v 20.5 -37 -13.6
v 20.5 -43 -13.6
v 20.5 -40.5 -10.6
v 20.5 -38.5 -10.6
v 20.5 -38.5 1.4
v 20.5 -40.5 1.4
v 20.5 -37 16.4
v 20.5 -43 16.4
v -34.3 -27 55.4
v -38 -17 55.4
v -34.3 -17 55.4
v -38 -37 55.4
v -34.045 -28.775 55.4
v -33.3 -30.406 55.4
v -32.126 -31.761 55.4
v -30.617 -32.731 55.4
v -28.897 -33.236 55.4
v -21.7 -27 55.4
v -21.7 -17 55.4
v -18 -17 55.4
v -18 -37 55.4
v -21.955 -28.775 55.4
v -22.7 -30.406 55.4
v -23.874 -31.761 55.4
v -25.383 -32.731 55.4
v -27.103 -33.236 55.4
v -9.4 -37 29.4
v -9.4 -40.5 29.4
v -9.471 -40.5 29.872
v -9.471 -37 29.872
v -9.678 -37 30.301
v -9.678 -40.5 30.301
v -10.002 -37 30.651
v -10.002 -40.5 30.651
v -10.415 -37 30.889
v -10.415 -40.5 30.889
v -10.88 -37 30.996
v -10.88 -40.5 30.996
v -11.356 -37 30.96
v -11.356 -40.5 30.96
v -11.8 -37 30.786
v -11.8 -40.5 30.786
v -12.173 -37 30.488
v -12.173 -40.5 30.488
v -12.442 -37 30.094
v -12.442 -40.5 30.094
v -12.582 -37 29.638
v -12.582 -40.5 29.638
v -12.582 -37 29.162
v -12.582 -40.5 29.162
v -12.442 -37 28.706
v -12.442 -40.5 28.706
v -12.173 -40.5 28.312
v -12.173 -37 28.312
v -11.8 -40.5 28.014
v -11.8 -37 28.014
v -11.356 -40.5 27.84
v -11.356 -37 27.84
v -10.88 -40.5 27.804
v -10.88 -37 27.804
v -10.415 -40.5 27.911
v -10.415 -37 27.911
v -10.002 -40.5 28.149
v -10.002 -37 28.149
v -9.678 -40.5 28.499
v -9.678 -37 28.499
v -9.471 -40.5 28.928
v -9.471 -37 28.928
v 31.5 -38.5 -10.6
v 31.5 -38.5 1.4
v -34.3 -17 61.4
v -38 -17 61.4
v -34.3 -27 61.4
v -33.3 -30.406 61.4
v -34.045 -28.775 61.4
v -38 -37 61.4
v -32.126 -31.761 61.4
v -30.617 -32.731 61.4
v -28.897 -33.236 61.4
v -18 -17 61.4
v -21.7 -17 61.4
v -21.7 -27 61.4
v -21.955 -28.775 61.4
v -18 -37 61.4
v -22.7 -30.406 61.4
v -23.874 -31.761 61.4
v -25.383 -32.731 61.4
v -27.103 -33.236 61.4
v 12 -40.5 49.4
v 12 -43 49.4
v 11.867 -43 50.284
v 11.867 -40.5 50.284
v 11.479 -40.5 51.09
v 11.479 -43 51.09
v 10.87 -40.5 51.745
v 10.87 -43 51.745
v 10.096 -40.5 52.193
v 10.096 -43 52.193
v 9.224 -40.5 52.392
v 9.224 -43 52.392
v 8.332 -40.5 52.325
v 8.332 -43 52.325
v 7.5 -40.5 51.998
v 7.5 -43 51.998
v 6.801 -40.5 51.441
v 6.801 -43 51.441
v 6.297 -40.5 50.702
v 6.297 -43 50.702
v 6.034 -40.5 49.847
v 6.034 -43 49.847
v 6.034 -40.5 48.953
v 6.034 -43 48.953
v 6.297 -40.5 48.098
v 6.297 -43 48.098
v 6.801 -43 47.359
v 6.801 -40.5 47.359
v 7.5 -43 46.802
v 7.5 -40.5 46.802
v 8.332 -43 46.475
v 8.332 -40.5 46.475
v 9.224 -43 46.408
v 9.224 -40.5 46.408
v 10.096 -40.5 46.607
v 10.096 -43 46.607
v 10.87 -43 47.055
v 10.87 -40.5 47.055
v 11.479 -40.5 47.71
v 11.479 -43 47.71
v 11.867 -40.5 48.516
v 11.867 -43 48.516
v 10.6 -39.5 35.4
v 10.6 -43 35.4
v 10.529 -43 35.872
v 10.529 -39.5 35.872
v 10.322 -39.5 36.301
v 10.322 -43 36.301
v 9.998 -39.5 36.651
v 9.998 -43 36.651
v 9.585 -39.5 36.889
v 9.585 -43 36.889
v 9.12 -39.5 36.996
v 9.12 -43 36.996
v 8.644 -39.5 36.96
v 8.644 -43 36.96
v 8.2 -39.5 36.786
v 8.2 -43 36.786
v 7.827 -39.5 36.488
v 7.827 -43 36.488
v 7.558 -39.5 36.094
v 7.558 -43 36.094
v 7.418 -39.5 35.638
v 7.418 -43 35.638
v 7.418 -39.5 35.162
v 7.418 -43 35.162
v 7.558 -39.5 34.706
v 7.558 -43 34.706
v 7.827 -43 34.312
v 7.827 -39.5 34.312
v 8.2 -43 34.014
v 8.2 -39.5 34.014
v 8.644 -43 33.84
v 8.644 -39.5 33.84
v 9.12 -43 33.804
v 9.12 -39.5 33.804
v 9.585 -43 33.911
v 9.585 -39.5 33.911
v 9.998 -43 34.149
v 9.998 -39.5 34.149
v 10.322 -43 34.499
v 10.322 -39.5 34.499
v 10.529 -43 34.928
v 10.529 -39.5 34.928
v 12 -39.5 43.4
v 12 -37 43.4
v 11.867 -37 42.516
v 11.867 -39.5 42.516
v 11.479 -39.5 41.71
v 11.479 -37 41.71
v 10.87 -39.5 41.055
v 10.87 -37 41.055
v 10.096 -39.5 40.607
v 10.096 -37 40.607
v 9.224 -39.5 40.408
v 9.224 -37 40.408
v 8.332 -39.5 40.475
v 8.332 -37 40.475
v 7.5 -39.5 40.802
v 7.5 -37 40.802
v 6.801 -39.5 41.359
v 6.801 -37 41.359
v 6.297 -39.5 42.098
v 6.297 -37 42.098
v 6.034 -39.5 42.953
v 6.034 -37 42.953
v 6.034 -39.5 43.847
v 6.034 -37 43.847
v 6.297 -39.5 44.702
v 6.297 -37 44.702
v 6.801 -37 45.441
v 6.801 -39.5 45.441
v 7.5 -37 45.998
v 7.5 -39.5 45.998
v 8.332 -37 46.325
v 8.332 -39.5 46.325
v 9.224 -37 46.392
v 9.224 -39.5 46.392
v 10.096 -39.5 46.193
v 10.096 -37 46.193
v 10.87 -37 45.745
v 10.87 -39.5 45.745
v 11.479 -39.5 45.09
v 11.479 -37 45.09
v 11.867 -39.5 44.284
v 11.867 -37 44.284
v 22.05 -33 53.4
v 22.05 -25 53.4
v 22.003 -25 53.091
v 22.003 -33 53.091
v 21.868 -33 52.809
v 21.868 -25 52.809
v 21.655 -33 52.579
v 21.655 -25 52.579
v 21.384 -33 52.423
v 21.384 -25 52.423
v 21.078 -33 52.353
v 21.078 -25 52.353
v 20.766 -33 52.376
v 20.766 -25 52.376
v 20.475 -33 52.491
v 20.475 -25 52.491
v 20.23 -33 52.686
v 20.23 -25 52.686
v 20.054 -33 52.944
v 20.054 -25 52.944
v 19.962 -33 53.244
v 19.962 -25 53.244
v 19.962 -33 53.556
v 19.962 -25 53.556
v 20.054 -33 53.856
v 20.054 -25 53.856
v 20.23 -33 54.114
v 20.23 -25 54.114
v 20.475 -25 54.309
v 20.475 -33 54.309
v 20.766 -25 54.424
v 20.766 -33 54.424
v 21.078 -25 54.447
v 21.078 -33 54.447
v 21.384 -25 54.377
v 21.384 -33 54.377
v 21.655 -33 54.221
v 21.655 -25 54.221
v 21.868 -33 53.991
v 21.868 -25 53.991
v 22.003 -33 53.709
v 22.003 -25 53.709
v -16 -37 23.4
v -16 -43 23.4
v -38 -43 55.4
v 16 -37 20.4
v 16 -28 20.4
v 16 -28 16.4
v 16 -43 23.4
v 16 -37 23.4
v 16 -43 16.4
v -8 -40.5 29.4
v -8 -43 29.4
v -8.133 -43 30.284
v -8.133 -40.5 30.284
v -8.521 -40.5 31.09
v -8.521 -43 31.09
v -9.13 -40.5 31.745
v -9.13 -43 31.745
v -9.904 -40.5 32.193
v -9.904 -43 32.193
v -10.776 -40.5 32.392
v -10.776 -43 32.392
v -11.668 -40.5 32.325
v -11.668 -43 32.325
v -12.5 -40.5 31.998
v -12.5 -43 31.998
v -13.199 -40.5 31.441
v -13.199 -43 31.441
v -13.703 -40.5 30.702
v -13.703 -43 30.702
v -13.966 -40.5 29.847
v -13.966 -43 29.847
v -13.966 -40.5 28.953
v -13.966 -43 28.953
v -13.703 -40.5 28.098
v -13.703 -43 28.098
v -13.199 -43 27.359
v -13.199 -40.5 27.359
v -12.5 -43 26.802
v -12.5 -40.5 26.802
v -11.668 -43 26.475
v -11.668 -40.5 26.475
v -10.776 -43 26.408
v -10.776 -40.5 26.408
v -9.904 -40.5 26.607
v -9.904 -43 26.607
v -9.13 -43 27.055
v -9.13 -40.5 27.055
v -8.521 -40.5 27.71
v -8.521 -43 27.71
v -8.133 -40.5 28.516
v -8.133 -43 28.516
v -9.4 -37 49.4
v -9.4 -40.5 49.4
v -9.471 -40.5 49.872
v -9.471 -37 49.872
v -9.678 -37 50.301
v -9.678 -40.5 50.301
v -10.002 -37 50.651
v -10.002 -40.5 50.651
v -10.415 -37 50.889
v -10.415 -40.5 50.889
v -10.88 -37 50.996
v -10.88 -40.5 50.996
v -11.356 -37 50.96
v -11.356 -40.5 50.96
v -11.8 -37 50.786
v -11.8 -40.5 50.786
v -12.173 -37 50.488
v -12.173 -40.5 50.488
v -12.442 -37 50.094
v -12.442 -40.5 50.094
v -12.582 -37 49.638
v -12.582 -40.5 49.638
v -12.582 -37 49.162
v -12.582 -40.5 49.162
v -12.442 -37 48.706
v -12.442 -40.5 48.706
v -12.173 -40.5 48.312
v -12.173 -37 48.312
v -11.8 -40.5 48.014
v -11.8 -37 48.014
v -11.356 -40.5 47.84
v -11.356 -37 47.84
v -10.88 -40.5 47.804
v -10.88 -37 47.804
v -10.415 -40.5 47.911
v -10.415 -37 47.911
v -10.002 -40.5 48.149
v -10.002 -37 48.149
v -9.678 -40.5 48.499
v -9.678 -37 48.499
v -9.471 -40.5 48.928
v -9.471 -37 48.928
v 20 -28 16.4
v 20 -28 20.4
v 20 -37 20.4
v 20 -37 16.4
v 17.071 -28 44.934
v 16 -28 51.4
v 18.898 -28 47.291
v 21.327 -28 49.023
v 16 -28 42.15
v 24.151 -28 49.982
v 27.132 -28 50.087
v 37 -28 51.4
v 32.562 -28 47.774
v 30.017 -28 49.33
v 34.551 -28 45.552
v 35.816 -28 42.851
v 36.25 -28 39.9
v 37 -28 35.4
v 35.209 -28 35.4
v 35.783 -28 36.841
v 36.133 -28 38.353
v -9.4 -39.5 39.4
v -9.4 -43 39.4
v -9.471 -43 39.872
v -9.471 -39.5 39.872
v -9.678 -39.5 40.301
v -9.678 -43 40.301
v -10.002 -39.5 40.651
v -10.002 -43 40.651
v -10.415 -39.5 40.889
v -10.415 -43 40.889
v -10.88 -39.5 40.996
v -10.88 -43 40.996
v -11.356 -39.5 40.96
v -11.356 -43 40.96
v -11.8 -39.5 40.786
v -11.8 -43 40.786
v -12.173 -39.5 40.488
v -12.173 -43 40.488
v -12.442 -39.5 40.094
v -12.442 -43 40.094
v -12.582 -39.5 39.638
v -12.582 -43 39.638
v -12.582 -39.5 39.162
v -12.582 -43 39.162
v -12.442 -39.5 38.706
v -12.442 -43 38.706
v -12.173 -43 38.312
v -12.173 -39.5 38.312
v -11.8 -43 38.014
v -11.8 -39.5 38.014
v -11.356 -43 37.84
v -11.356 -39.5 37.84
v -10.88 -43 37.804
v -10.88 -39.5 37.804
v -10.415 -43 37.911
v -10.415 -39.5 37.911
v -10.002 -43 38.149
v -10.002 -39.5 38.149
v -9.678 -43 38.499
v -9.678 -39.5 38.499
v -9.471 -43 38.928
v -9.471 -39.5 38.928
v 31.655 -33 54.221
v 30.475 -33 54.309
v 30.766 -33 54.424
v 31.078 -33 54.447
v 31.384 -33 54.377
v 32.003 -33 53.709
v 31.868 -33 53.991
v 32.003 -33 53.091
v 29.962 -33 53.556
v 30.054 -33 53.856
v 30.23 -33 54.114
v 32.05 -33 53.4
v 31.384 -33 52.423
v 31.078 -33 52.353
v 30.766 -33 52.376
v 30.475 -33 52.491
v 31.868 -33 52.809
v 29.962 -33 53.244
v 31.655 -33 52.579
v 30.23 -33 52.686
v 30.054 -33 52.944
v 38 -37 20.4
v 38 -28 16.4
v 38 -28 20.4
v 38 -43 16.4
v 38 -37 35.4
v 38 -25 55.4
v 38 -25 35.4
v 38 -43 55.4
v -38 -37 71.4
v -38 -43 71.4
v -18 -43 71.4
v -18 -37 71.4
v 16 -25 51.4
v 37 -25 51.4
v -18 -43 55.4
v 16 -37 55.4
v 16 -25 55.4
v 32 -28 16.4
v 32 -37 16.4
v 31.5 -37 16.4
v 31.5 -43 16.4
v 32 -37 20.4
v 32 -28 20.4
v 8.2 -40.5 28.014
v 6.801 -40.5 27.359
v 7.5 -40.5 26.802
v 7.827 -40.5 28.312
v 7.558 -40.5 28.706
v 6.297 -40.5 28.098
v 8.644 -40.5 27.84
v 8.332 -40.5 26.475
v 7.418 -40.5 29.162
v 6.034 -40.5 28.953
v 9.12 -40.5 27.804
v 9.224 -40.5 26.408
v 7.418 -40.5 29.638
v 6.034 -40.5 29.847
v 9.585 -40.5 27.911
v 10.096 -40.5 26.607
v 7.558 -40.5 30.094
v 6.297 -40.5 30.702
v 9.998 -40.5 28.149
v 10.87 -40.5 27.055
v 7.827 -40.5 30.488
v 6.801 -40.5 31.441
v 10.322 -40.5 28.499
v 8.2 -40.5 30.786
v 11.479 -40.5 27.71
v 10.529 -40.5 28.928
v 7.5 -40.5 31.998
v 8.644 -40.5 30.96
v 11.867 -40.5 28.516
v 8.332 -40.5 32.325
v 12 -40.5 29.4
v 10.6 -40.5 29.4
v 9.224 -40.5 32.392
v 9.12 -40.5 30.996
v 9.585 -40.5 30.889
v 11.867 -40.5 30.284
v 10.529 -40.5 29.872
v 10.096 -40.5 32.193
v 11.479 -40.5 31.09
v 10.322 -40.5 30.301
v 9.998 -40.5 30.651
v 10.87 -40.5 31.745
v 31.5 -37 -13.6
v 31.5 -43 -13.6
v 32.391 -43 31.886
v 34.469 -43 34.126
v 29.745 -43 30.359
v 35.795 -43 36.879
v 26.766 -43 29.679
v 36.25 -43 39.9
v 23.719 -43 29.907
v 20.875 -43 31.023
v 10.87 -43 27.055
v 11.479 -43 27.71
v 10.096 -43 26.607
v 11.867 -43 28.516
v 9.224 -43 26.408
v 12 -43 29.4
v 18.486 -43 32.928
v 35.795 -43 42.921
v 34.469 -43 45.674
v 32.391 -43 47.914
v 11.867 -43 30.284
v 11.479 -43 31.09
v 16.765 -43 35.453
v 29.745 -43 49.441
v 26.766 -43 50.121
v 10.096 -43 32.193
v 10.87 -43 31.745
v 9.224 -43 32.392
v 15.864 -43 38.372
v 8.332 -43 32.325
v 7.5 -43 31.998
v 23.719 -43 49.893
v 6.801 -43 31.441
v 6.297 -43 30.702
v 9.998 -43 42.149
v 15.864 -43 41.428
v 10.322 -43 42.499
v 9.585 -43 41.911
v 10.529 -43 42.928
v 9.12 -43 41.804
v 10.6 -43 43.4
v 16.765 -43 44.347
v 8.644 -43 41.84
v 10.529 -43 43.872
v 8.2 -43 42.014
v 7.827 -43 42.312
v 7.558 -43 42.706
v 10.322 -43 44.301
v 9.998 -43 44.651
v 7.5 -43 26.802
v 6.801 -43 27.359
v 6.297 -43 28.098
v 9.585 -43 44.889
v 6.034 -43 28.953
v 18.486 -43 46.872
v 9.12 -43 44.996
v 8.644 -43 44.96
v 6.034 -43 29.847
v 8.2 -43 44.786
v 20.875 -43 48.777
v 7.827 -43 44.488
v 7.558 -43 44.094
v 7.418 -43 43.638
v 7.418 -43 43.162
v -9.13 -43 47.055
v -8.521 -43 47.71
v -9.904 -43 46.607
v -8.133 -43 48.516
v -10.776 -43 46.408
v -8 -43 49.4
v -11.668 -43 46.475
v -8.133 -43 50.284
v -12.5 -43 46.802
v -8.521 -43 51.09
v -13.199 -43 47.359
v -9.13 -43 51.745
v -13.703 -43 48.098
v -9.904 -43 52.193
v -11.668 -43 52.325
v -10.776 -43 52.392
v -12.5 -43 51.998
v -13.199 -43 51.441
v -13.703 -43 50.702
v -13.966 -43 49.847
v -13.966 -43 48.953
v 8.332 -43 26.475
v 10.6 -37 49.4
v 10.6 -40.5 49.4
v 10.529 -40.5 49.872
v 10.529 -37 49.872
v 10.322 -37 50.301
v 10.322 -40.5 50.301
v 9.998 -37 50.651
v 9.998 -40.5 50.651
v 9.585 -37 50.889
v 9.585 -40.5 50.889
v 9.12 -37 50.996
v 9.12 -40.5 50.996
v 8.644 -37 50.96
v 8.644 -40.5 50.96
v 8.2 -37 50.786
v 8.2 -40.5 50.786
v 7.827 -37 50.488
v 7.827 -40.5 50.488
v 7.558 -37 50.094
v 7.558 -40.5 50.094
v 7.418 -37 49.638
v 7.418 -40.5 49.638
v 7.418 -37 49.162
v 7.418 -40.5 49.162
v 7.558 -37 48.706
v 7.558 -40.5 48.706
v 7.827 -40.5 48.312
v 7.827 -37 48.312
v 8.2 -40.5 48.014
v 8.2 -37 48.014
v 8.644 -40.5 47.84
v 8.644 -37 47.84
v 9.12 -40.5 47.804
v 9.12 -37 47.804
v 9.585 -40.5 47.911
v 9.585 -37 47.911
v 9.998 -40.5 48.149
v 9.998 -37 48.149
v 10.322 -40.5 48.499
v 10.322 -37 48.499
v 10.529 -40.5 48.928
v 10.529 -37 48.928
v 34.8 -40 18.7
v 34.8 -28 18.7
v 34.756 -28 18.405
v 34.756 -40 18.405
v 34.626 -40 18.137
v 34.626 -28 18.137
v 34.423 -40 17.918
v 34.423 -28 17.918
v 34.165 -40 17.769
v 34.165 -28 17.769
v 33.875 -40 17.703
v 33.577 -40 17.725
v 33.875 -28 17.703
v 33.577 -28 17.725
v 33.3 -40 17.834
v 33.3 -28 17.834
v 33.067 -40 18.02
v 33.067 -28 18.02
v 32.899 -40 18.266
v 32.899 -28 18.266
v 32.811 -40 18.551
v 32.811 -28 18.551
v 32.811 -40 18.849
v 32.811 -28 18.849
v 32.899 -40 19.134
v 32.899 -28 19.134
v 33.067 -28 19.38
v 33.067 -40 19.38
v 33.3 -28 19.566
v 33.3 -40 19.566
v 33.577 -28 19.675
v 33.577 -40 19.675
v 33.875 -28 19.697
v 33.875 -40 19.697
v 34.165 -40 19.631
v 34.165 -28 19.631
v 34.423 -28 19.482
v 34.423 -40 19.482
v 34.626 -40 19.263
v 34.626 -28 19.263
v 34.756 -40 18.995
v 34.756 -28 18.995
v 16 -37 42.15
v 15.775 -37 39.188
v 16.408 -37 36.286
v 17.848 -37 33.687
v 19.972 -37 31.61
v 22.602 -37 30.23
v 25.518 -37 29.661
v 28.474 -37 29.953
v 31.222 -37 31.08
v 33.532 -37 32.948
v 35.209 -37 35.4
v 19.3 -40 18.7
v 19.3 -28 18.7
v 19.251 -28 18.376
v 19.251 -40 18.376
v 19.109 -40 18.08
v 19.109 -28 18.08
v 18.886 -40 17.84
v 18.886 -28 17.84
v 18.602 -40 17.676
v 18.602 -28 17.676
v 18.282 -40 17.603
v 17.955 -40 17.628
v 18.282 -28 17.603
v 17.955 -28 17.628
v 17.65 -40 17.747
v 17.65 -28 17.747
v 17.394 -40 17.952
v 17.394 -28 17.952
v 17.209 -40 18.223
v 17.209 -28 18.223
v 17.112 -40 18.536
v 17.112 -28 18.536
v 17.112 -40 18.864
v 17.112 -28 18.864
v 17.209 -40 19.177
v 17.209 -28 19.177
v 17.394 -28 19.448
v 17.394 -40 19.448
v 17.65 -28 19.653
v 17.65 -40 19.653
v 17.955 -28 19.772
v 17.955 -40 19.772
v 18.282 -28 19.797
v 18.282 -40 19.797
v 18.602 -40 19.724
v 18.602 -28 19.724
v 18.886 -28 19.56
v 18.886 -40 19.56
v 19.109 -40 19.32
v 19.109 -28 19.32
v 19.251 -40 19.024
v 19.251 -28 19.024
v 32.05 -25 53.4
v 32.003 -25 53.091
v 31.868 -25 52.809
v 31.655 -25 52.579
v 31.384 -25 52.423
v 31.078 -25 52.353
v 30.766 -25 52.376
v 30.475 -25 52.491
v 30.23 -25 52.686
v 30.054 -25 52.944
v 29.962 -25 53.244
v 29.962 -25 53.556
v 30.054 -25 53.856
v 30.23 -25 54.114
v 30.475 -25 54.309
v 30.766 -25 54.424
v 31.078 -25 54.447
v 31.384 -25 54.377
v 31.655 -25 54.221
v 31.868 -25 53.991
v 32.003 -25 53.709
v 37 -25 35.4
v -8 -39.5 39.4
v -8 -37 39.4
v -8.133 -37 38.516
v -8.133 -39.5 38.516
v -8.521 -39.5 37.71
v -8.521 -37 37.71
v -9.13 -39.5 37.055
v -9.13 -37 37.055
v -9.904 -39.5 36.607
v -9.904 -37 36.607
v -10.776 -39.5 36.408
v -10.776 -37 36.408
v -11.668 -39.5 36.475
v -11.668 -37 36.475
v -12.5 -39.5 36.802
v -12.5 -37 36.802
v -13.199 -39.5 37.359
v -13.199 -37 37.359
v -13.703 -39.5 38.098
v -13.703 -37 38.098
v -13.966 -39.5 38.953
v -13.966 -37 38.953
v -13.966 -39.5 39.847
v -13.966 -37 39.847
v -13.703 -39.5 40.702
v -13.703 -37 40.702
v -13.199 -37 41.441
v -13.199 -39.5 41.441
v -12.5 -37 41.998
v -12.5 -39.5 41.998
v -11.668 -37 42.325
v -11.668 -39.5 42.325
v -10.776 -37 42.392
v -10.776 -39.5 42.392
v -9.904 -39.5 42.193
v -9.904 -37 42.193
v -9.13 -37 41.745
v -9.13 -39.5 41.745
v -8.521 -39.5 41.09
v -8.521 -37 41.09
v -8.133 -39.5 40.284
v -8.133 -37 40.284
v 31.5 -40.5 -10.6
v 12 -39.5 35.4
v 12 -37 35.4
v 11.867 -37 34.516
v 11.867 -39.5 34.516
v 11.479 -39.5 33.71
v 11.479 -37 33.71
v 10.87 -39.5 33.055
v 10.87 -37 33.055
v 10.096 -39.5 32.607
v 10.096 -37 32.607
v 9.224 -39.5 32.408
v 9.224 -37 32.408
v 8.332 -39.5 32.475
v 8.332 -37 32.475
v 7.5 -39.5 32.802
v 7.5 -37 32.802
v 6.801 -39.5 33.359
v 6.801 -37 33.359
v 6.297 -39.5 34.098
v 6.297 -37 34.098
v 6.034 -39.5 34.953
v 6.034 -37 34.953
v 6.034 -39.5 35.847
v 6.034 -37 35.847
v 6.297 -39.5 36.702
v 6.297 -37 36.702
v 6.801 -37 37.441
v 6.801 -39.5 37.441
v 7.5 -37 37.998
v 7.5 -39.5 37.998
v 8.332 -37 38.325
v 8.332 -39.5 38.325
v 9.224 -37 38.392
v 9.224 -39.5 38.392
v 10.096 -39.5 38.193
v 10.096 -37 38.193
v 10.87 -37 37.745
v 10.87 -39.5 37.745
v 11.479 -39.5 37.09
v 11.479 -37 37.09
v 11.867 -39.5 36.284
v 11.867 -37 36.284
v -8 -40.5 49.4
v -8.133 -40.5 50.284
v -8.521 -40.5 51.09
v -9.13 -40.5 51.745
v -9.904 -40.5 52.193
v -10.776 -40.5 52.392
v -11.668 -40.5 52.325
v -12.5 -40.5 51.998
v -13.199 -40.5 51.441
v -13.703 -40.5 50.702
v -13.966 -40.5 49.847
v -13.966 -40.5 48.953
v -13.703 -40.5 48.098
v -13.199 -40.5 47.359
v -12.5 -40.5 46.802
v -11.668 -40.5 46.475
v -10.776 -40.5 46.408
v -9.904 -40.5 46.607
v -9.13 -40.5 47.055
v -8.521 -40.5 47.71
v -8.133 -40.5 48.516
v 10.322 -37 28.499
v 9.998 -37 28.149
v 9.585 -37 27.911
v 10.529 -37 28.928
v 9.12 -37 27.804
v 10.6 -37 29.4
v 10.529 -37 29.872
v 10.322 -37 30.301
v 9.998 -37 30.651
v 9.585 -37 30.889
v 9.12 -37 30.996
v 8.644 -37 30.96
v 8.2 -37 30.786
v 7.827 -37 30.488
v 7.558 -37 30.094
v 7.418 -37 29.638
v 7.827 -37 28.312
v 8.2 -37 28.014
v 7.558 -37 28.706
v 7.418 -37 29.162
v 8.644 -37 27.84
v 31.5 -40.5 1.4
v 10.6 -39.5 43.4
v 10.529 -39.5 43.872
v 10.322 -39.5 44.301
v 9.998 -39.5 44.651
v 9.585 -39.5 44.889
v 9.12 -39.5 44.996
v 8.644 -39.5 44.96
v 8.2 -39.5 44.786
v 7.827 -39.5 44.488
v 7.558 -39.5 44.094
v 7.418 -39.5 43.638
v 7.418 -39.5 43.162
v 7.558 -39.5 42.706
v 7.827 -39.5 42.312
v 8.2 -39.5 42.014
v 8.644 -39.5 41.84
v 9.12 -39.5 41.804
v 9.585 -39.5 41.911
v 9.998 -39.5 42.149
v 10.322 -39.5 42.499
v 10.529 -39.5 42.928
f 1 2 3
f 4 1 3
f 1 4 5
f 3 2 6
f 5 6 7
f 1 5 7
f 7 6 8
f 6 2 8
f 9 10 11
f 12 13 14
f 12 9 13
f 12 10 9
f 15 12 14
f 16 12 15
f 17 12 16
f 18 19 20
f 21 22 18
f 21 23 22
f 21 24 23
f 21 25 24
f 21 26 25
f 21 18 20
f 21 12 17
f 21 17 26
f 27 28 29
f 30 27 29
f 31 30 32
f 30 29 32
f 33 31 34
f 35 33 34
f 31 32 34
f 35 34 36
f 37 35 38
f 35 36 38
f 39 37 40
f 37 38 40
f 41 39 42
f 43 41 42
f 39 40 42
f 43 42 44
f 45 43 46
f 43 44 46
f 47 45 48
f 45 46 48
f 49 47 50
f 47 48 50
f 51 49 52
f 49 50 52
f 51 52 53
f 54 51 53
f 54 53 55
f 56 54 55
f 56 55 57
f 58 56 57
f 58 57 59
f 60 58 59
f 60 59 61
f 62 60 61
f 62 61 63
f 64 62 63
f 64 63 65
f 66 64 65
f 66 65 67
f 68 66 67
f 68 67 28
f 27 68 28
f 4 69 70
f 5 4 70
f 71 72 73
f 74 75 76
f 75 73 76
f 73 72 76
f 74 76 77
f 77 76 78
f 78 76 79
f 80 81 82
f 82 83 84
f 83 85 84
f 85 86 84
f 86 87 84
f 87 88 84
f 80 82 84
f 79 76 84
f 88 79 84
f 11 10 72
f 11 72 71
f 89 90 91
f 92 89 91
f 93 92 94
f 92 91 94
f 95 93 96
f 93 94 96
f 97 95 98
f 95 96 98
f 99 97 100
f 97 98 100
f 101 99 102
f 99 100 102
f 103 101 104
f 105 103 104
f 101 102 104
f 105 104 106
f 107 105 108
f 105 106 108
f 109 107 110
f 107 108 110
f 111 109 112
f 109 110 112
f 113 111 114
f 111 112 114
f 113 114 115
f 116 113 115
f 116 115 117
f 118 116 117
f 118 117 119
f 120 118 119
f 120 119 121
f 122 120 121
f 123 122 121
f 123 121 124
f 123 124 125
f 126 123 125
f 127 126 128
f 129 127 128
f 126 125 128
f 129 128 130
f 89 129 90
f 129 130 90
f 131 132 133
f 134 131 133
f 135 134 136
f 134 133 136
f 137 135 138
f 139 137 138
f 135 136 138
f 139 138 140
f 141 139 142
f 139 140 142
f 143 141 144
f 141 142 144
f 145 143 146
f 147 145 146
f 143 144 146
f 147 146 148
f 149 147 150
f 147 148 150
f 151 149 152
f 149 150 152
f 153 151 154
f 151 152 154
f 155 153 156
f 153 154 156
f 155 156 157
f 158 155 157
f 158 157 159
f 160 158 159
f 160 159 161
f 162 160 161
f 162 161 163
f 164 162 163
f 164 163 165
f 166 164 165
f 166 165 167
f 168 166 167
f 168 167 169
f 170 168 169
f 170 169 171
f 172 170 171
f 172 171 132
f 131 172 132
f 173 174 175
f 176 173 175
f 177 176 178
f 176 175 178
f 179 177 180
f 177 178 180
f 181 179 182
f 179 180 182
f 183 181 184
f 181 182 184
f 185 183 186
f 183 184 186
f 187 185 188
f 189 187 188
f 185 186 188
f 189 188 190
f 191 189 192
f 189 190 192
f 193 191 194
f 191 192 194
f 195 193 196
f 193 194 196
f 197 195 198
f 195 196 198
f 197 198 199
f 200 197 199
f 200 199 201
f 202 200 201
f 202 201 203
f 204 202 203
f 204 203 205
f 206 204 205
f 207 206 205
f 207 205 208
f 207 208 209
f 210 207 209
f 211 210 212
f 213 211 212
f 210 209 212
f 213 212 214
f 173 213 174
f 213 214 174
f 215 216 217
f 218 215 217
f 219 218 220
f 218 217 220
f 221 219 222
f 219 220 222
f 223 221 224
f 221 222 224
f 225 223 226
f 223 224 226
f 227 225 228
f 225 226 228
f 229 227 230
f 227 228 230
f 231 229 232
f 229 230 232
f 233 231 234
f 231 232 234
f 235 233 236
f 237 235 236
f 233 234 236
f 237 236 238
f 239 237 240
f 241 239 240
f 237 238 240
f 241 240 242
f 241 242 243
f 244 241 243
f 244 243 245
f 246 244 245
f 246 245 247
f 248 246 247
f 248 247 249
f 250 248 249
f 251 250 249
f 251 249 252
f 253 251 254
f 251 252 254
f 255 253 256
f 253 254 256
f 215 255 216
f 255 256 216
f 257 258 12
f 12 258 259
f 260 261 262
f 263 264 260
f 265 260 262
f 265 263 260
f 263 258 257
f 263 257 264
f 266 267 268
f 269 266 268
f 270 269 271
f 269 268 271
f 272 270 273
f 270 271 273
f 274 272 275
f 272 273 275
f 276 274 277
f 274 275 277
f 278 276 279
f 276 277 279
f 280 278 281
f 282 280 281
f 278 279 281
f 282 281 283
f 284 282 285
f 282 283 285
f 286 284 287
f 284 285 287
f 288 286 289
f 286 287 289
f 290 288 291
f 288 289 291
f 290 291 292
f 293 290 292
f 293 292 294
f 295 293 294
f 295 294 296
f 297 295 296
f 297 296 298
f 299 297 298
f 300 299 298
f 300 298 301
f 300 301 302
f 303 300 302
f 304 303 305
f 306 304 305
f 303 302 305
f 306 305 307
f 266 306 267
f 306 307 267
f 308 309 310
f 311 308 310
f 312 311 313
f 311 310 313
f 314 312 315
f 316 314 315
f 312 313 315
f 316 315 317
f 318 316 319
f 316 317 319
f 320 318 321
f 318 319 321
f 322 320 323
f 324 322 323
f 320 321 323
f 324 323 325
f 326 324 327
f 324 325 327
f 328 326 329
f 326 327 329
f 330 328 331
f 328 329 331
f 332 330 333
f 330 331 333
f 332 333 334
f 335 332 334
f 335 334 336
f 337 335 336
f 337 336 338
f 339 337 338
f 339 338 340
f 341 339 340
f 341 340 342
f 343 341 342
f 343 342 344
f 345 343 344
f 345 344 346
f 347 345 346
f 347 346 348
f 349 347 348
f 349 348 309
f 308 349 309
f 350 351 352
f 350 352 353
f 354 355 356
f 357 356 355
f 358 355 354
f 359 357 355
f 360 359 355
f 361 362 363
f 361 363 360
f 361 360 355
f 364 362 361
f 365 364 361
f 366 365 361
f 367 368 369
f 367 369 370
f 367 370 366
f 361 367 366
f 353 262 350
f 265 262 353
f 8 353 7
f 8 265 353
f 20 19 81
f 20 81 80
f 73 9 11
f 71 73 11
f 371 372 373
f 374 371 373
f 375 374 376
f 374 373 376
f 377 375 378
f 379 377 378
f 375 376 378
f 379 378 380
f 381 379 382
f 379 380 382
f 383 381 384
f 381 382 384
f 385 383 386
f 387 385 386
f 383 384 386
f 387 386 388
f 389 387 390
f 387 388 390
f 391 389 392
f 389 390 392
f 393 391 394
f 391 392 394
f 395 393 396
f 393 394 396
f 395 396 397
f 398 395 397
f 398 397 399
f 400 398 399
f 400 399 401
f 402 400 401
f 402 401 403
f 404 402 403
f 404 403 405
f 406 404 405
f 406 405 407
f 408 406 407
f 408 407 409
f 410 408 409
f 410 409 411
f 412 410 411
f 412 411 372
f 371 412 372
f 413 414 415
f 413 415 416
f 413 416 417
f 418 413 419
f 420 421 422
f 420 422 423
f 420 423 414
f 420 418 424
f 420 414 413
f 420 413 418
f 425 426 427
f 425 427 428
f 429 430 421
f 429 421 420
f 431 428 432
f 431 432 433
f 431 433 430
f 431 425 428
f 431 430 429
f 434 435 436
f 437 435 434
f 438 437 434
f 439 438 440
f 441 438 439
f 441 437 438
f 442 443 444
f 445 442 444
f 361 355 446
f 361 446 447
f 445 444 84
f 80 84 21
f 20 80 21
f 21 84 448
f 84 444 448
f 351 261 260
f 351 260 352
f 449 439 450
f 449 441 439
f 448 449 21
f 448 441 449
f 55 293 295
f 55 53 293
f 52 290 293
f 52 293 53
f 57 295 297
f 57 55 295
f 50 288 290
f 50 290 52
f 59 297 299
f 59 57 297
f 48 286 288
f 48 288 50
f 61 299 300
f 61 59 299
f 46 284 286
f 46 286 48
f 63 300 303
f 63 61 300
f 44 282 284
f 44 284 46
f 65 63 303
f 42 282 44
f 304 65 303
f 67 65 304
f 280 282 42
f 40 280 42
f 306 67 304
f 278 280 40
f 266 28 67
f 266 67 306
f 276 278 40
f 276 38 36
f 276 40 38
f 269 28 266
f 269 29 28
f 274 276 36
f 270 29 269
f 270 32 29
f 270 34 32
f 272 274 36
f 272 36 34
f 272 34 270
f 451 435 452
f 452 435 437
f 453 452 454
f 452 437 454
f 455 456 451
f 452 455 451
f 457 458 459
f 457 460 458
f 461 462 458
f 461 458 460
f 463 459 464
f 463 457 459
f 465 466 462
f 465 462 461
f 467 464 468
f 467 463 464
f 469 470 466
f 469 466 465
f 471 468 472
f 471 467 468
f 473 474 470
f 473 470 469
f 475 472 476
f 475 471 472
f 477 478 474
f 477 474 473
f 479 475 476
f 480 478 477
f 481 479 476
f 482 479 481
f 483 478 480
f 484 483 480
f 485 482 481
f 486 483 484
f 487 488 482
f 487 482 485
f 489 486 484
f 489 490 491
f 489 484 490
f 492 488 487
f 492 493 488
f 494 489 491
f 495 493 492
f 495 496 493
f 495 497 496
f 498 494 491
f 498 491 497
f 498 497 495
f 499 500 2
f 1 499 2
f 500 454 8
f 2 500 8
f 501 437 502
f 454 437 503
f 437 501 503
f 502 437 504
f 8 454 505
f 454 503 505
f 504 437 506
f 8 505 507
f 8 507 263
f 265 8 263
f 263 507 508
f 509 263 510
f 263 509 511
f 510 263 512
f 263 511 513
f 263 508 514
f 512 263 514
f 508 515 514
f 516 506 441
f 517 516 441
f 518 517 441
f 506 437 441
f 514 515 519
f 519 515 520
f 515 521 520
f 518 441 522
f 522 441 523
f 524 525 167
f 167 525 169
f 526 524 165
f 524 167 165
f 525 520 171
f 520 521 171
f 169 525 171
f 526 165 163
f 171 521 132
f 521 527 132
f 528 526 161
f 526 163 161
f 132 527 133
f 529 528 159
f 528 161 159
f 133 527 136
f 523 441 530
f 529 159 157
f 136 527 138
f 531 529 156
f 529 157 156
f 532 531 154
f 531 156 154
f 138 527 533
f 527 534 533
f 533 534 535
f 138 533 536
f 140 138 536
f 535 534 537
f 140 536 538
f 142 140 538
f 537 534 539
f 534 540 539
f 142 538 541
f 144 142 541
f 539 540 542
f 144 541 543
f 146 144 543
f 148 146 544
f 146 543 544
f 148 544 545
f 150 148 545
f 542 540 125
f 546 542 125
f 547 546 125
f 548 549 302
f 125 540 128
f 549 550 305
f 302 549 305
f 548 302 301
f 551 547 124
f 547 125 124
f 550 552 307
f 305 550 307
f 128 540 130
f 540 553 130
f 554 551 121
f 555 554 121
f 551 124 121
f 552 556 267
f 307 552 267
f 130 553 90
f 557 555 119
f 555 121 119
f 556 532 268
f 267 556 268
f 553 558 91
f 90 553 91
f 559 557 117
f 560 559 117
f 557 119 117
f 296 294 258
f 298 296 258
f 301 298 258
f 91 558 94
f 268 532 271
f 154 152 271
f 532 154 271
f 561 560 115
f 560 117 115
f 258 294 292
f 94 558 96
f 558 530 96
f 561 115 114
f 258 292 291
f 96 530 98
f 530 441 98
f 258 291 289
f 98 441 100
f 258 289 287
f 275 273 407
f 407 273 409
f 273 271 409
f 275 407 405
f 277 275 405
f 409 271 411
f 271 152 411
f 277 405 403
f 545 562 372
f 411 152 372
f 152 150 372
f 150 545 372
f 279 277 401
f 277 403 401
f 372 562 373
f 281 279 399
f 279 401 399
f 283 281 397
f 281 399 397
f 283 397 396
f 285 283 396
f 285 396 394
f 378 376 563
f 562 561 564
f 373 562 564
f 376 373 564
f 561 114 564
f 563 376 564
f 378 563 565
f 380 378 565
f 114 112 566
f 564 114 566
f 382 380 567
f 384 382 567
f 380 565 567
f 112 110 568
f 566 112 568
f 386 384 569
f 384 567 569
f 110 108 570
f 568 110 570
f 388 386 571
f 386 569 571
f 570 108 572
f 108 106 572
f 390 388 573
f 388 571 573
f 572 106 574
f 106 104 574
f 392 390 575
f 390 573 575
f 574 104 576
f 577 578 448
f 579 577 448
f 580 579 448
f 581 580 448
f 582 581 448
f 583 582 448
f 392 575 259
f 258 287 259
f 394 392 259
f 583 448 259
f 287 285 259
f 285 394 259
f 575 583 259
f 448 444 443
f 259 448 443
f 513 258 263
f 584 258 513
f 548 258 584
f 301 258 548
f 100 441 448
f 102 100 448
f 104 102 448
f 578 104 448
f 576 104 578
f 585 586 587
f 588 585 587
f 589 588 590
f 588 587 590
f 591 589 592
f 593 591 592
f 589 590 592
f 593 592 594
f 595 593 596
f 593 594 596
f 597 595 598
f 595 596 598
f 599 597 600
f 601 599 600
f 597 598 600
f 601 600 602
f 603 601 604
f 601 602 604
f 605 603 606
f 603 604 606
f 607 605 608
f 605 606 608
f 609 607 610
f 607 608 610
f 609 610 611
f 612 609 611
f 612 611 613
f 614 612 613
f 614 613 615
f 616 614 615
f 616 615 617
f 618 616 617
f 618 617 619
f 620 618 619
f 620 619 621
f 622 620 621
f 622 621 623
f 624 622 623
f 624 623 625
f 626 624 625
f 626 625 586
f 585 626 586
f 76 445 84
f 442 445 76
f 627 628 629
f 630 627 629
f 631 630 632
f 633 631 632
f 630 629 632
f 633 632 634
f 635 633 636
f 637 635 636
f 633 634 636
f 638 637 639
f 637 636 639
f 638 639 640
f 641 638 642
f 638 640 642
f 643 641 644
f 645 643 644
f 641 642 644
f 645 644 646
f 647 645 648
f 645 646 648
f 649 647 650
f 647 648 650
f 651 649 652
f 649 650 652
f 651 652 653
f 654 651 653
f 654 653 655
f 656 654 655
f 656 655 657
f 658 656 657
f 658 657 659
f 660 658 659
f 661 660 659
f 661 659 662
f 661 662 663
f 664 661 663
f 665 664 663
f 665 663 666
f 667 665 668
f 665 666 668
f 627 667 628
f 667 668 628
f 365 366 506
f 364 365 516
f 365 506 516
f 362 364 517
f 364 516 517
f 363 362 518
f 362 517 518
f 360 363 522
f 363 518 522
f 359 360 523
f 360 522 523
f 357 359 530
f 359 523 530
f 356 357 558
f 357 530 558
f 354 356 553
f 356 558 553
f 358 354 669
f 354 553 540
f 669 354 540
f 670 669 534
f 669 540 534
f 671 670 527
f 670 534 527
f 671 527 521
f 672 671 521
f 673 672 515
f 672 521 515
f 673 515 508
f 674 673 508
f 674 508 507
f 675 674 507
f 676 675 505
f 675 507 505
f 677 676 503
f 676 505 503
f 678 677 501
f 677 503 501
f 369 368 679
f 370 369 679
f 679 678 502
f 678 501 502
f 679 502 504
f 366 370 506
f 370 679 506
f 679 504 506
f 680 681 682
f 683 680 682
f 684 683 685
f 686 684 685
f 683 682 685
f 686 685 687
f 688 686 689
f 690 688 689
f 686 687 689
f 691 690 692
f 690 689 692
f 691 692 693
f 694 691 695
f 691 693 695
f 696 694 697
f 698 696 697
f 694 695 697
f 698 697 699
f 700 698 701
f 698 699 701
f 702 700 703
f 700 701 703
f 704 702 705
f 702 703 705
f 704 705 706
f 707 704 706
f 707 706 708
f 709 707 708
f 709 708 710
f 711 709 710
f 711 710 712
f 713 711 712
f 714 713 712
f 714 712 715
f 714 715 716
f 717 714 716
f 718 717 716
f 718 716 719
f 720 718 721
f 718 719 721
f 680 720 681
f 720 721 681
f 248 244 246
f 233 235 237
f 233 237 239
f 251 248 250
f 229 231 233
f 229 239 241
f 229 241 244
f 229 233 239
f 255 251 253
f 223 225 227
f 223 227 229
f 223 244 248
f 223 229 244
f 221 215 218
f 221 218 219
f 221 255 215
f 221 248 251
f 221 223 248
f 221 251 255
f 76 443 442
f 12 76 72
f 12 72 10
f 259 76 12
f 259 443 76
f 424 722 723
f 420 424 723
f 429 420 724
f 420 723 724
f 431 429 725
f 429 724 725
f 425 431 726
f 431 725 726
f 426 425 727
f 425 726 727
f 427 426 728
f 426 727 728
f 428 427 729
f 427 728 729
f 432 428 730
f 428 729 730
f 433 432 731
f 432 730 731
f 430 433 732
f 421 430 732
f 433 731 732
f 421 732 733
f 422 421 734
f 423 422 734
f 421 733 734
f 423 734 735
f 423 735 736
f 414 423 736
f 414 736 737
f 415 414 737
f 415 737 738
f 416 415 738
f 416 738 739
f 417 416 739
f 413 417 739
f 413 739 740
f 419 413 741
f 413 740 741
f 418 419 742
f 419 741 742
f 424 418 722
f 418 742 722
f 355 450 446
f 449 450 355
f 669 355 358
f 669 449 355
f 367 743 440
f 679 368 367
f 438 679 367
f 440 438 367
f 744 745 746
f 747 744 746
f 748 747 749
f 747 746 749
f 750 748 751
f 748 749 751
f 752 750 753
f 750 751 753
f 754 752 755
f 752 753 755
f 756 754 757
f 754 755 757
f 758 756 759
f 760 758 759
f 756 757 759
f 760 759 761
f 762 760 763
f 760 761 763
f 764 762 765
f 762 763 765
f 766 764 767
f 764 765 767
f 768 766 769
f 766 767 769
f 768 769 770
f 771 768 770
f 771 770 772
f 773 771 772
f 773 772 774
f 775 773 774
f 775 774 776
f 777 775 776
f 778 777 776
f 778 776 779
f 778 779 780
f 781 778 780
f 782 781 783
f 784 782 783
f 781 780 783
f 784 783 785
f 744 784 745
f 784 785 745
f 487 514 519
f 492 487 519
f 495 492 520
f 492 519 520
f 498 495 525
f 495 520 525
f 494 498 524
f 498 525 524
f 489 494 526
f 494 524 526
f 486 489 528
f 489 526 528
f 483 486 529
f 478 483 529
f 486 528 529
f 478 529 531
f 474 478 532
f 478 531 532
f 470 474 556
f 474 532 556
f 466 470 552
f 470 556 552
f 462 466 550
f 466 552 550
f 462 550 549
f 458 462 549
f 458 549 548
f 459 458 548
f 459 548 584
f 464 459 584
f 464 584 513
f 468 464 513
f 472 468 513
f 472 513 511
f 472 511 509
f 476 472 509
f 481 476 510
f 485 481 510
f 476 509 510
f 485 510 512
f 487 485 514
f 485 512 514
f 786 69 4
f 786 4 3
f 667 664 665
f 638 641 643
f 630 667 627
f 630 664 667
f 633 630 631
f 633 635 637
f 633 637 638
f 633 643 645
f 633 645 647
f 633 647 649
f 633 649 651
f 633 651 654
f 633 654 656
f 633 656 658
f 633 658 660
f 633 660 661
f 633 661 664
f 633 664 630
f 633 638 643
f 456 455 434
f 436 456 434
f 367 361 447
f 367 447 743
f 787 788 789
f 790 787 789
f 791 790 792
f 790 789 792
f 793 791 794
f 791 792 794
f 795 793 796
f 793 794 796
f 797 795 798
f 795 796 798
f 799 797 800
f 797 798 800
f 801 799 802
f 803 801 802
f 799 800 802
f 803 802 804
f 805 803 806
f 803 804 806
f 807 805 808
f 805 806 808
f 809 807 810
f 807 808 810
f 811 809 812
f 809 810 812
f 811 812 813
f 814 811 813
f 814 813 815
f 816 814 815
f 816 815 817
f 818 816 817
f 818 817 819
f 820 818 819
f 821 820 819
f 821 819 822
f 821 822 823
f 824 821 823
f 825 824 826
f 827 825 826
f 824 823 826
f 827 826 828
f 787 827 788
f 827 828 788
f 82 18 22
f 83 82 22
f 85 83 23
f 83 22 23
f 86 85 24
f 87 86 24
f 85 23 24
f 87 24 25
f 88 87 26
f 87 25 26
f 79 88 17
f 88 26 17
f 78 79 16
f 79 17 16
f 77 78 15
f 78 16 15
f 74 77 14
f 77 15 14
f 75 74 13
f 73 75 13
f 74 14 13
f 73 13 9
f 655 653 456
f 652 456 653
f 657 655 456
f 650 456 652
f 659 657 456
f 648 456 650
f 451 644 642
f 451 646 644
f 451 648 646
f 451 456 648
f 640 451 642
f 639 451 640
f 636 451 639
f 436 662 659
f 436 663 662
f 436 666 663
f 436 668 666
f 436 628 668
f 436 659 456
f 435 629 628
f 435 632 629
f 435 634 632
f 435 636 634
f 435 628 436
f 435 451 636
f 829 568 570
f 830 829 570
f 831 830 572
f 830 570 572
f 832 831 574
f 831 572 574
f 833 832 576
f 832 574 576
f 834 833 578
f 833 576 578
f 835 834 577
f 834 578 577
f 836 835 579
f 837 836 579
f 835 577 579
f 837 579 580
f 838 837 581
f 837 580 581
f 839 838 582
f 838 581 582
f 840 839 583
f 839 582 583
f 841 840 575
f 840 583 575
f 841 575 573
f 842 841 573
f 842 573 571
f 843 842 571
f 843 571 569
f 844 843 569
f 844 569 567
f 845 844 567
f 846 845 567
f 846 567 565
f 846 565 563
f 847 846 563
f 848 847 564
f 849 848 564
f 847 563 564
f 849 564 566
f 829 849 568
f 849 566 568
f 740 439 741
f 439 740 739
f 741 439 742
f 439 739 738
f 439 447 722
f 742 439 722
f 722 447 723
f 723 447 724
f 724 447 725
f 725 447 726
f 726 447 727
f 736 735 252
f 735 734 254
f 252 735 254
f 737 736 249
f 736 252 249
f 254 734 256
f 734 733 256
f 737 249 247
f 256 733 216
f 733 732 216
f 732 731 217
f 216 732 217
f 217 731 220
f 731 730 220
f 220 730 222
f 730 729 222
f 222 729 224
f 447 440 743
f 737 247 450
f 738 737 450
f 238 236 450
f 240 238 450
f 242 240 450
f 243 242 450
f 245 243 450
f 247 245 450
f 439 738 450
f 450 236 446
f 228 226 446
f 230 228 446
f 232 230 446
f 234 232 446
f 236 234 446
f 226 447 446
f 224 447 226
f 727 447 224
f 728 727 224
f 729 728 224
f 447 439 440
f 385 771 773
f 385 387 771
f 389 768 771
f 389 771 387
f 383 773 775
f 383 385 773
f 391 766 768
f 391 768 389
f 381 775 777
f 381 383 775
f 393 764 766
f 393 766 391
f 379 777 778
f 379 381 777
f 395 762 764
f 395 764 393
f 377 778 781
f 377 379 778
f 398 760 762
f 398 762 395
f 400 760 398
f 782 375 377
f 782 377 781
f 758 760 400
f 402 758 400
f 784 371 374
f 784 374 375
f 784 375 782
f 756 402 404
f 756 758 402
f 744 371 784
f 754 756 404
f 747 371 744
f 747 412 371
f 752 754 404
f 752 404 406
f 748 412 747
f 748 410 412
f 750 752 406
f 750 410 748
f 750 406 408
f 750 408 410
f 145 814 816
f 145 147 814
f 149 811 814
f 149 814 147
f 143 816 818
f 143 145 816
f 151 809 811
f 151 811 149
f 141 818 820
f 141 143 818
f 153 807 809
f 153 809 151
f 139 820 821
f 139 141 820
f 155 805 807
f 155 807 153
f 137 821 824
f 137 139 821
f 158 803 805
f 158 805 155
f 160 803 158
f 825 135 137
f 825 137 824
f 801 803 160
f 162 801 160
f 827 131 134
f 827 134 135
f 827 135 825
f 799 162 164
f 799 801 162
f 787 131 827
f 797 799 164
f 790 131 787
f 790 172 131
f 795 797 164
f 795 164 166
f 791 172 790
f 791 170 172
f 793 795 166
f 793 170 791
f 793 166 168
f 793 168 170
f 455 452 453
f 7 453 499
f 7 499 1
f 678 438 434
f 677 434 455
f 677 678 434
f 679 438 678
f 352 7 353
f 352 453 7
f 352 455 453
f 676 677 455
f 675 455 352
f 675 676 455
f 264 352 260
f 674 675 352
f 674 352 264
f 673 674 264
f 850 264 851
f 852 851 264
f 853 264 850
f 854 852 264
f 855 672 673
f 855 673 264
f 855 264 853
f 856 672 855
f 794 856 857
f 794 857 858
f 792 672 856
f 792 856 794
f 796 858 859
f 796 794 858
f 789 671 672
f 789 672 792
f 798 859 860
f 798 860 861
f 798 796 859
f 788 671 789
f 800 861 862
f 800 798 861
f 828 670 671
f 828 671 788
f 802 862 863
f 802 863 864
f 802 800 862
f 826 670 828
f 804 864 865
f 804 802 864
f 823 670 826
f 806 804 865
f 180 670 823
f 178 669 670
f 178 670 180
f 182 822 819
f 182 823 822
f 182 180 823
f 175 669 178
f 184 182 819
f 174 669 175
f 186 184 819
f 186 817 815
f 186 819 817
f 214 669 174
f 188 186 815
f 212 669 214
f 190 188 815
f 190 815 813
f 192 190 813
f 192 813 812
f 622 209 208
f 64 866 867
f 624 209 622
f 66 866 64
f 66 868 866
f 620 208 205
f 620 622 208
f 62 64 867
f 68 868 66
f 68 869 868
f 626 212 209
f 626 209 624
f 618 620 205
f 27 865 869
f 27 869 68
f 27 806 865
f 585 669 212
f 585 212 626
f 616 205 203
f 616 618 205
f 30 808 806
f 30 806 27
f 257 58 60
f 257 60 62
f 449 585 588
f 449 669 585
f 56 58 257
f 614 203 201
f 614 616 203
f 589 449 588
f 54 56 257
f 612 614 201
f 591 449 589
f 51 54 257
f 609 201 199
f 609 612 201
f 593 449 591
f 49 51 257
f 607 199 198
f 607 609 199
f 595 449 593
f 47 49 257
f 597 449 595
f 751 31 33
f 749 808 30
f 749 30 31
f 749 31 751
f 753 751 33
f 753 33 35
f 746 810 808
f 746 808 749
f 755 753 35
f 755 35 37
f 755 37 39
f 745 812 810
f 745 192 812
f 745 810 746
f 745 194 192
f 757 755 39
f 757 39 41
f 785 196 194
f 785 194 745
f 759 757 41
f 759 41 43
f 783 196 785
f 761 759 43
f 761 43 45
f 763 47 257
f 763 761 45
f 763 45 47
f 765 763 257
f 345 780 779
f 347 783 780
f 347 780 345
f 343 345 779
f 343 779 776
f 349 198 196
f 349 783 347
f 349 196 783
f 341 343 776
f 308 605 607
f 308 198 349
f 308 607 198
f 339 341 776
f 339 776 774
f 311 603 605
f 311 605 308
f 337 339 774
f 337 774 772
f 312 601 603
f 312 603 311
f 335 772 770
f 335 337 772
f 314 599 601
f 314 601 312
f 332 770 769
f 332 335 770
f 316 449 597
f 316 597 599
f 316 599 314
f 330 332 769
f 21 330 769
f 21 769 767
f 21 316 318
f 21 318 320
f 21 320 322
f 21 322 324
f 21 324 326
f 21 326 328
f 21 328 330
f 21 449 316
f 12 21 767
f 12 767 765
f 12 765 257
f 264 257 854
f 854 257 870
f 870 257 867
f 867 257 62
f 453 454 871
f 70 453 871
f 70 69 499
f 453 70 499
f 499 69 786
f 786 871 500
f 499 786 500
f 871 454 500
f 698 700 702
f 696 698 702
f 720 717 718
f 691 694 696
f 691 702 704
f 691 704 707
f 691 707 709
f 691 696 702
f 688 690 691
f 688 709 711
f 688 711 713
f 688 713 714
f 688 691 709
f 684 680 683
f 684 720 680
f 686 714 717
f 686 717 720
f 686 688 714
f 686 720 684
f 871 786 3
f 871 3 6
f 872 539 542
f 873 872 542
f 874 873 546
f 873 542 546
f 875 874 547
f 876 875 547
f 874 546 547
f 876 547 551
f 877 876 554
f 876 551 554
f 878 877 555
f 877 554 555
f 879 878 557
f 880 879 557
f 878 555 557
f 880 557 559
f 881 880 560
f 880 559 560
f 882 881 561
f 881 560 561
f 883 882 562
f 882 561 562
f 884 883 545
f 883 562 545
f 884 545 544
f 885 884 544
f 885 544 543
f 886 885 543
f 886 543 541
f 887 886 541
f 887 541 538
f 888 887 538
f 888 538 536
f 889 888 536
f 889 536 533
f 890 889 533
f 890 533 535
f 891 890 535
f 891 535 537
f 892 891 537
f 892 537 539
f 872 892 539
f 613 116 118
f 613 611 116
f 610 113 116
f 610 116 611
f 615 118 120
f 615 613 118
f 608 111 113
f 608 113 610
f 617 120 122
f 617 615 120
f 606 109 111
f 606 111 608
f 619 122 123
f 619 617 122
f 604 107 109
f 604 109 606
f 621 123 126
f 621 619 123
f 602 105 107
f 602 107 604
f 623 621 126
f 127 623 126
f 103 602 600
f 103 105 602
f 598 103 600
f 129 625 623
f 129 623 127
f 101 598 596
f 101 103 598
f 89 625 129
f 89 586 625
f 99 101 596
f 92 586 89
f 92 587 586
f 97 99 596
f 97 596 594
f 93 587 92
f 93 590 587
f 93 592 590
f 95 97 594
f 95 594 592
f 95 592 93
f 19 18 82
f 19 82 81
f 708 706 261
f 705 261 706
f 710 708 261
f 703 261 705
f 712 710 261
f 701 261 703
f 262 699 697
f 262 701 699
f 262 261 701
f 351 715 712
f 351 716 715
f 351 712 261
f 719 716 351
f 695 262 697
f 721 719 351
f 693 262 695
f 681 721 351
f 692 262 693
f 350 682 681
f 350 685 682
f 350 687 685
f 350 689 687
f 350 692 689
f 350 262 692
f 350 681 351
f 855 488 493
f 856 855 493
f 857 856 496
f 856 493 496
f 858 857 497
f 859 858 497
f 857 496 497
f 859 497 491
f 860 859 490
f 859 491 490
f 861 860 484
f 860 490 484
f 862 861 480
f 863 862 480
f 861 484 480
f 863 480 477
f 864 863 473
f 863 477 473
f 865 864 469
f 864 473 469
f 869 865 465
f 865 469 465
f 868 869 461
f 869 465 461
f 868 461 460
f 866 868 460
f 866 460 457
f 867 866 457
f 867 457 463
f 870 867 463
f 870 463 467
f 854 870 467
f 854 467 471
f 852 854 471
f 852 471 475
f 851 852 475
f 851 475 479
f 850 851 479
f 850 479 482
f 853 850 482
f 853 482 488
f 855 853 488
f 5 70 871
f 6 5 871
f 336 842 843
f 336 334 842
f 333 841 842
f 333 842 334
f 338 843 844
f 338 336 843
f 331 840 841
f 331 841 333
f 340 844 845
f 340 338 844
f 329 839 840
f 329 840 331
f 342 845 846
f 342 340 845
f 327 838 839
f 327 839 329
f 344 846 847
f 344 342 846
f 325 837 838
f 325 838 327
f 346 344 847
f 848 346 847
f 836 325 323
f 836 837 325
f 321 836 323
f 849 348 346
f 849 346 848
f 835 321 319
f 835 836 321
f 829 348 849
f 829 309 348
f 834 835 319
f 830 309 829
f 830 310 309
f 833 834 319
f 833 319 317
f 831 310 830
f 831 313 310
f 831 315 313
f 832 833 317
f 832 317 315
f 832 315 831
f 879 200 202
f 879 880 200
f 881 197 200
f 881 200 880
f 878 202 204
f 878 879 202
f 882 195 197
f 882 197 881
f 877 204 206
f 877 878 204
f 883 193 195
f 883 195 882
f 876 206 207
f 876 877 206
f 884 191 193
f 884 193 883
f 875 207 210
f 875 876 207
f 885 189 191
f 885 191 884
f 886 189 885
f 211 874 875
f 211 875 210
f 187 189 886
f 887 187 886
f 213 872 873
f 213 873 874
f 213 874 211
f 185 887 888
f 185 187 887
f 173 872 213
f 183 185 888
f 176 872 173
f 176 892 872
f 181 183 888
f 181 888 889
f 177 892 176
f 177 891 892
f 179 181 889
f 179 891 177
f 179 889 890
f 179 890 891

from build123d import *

# Parameters (mm, degrees)
SKETCH033_W     = 30
SKETCH033_H     = 32
PAD023_DEPTH    = 6
PAD024_DEPTH    = 6
SKETCH035_R     = 1.6
POCKET011_DEPTH = 6
SKETCH038_W     = 4
SKETCH038_H     = 4
SKETCH038_W_2   = 6
PAD027_DEPTH    = 9
SKETCH039_R     = 1.1
SKETCH039_R_2   = 1
POCKET012_DEPTH = 12
SKETCH040_R     = 10.25
POCKET013_DEPTH = 100
PAD028_DEPTH    = 9
POCKET014_DEPTH = 15
PAD029_DEPTH    = 3
SKETCH043_W     = 12
SKETCH043_H     = 2
POCKET015_DEPTH = 11
SKETCH045_W     = 20
SKETCH045_H     = 6
PAD030_DEPTH    = 20
POCKET016_DEPTH = 12
SKETCH047_R     = 1.6
POCKET017_DEPTH = 6
SKETCH048_R     = 3
POCKET018_DEPTH = 2.5
SKETCH049_R     = 3
POCKET019_DEPTH = 2.5
SKETCH058_R     = 1.05
POCKET021_DEPTH = 8


with BuildPart() as part:
    # Sketch033 → Pad023 (new body)
    with BuildSketch(Plane.XZ):
        Rectangle(SKETCH033_W, SKETCH033_H)
    extrude(amount=PAD023_DEPTH)

    # Sketch034 (on Face6 of Pad023) → Pad024 (join)
    with BuildSketch(Plane.XZ.offset(6)):
        Polygon((-15, 16), (15, 16), (39, 16), (39, -23), (32.5, -23), (32.5, -53), (21.5, -53), (21.5, -23), (17, -23), (17, -16), (15, -16), (-15, -16), (-37, 16), (-37, 32), (-17, 32), (-17, 16), align=None)
    extrude(amount=-PAD024_DEPTH)

    # Sketch035 (on Face14 of Pad024) → Pocket011 (cut)
    with BuildSketch(Plane.XZ.offset(6)):
        with Locations((-10, 10)):
            Circle(SKETCH035_R)
        with Locations((10, 10)):
            Circle(SKETCH035_R)
        with Locations((10, -10)):
            Circle(SKETCH035_R)
        with Locations((-10, -10)):
            Circle(SKETCH035_R)
    extrude(amount=-POCKET011_DEPTH, mode=Mode.SUBTRACT)

    # Sketch038 (on Face5 of Pocket011) → Pad027 (join)
    with BuildSketch(Plane(origin=(0, 0, 0), x_dir=(1, 0, 0), z_dir=(0, 1, 0))):
        with Locations((19, 21)):
            Rectangle(SKETCH038_W, SKETCH038_H)
        with Locations((36, 21)):
            Rectangle(SKETCH038_W_2, SKETCH038_H)
    extrude(amount=PAD027_DEPTH)

    # Sketch039 (on Face21 of Pad027) → Pocket012 (cut)
    with BuildSketch(Plane(origin=(0, 9, 0), x_dir=(1, 0, 0), z_dir=(0, 1, 0))):
        with Locations((19.2, 20.7)):
            Circle(SKETCH039_R)
        with Locations((34.8, 20.7)):
            Circle(SKETCH039_R_2)
    extrude(amount=-POCKET012_DEPTH, mode=Mode.SUBTRACT)

    # Sketch040 (on Face4 of Pocket012) → Pocket013 (cut)
    with BuildSketch(Plane.XZ.offset(6)):
        with Locations((27, 0.5)):
            Circle(SKETCH040_R)
    extrude(amount=-POCKET013_DEPTH, mode=Mode.SUBTRACT)

    # Sketch041 (on Face5 of Pocket013) → Pad028 (join)
    with BuildSketch(Plane(origin=(0, 0, 0), x_dir=(1, 0, 0), z_dir=(0, 1, 0))):
        Polygon((39, -16), (39, 4), (32, 4), (32, 0), (17, 0), (17, -16), align=None)
    extrude(amount=PAD028_DEPTH)

    # Sketch040 (on Face4 of Pocket012) → Pocket014 (cut)
    with BuildSketch(Plane.XZ.offset(6)):
        with Locations((27, 0.5)):
            Circle(SKETCH040_R)
    extrude(amount=-POCKET014_DEPTH, mode=Mode.SUBTRACT)

    # Sketch042 (on Face27 of Pocket014) → Pad029 (join)
    with BuildSketch(Plane(origin=(0, 9, 0), x_dir=(1, 0, 0), z_dir=(0, 1, 0))):
        Polygon((17, -12), (38, -12), (38, 4), (39, 4), (39, -16), (17, -16), align=None)
    extrude(amount=PAD029_DEPTH)

    # Sketch043 (on Face12 of Pad029) → Pocket015 (cut)
    with BuildSketch(Plane(origin=(32.5, 0, 0), x_dir=(0, 0, 1), z_dir=(1, 0, 0))):
        with Locations((-44, 2.5)):
            Rectangle(SKETCH043_W, SKETCH043_H)
    extrude(amount=-POCKET015_DEPTH, mode=Mode.SUBTRACT)

    # Sketch045 (on Face5 of Pocket015) → Pad030 (join)
    with BuildSketch(Plane(origin=(0, 0, 0), x_dir=(1, 0, 0), z_dir=(0, 1, 0))):
        with Locations((-27, -19)):
            Rectangle(SKETCH045_W, SKETCH045_H)
    extrude(amount=PAD030_DEPTH)

    # Sketch046 (on Face26 of Pad030) → Pocket016 (cut)
    with BuildSketch(Plane(origin=(0, 0, 16), x_dir=(1, 0, 0), z_dir=(0, 0, -1))):
        with BuildLine():
            ThreePointArc((-20.7, -10), (-27, -3.7), (-33.3, -10))
            Line((-33.3, -10), (-33.3, -25))
            ThreePointArc((-33.3, -25), (-27, -31.3), (-20.7, -25))
            Line((-20.7, -10), (-20.7, -25))
        make_face()
    extrude(amount=-POCKET016_DEPTH, mode=Mode.SUBTRACT)

    # Sketch047 (on Face4 of Pocket016) → Pocket017 (cut)
    with BuildSketch(Plane.XZ.offset(6)):
        with Locations((10, -4)):
            Circle(SKETCH047_R)
        with Locations((10, 4)):
            Circle(SKETCH047_R)
        with Locations((-10, 0)):
            Circle(SKETCH047_R)
    extrude(amount=-POCKET017_DEPTH, mode=Mode.SUBTRACT)

    # Sketch048 (on Face4 of Pocket017) → Pocket018 (cut)
    with BuildSketch(Plane.XZ.offset(6)):
        with Locations((-10, 10)):
            Circle(SKETCH048_R)
        with Locations((10, 10)):
            Circle(SKETCH048_R)
        with Locations((10, -10)):
            Circle(SKETCH048_R)
        with Locations((-10, -10)):
            Circle(SKETCH048_R)
    extrude(amount=-POCKET018_DEPTH, mode=Mode.SUBTRACT)

    # Sketch049 (on Face5 of Pocket018) → Pocket019 (cut)
    with BuildSketch(Plane(origin=(0, 0, 0), x_dir=(1, 0, 0), z_dir=(0, 1, 0))):
        with Locations((-10, 0)):
            Circle(SKETCH049_R)
        with Locations((10, 4)):
            Circle(SKETCH049_R)
        with Locations((10, -4)):
            Circle(SKETCH049_R)
    extrude(amount=-POCKET019_DEPTH, mode=Mode.SUBTRACT)

    # Sketch058 (on Face50 of Pocket019) → Pocket021 (cut)
    with BuildSketch(Plane(origin=(0, 12, 0), x_dir=(1, 0, 0), z_dir=(0, 1, 0))):
        with Locations((32, -14)):
            Circle(SKETCH058_R)
        with Locations((22, -14)):
            Circle(SKETCH058_R)
    extrude(amount=-POCKET021_DEPTH, mode=Mode.SUBTRACT)


with BuildPart() as part_1:
    # Body005 placement: moved
    add(part.part.moved(Location((-1, -37, 39.4))))


solid = part_1.part
